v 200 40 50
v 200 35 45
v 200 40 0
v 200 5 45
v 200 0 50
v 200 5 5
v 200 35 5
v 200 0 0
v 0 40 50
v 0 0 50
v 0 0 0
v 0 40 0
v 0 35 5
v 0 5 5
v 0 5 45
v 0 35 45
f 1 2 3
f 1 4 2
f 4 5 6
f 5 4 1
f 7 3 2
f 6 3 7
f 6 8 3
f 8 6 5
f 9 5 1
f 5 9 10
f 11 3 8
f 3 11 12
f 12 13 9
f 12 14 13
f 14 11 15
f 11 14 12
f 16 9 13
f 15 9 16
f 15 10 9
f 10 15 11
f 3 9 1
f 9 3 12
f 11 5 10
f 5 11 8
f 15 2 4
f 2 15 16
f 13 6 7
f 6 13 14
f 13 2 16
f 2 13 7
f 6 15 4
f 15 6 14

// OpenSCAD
$fn = 32;

// ----------------------------------------------------------------------
// Box beam: 200-250 mm hollow beam
// ----------------------------------------------------------------------

// --- parameters (mm) ---
beam_l = 200;             // beam length, X
beam_w = 40;              // beam width, Y
beam_h = 50;              // beam height, Z
wall = 5;                 // wall thickness

difference() {
  cube([beam_l, beam_w, beam_h]);
  translate([-1, wall, wall])
    cube([beam_l + 2, beam_w - 2 * wall, beam_h - 2 * wall]);
}
